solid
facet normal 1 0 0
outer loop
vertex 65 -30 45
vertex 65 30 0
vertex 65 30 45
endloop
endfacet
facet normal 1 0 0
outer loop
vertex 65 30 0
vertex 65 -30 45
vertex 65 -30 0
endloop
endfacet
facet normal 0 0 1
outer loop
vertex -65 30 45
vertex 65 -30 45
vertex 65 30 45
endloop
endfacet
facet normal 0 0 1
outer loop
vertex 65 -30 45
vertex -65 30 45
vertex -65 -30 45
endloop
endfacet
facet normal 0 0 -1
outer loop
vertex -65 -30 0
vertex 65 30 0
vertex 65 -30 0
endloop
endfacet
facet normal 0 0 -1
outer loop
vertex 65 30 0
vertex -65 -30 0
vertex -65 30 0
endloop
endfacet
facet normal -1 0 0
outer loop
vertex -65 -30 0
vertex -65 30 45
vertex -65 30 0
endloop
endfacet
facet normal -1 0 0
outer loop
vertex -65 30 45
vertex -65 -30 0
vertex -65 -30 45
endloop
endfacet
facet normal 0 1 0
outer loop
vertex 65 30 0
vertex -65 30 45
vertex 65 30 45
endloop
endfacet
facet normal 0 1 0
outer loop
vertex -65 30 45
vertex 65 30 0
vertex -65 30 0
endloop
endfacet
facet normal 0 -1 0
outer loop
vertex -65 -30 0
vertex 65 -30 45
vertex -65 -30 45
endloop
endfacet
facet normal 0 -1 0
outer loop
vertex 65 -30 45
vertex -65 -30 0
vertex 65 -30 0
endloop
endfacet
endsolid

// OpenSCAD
// 15 mL conical tube rack – 5 holes, 30° lean, FDM print orientation
// Block rests on the XY plane (z = 0) and is centred on the origin in X and Y.

$fn = 64;

// ---- Block dimensions (measured with calipers) ----
L = 130;   // length along X
W = 60;    // depth along Y
H = 45;    // height along Z

// ---- Hole parameters ----
n_holes   = 5;
spacing   = 24;   // hole-to-hole pitch along X
hole_d    = 17.5; // cylinder diameter, square to its axis
hole_r    = hole_d / 2;
hole_depth = 40;  // depth measured along the hole axis, from the top face

// ---- Lean geometry ----
// Each axis meets the top face at y = -10 and is tilted 30° from vertical
// in the YZ plane; going down into the block it moves toward +Y.
// A 30° tilt from vertical means the axis makes 60° with the +Z direction,
// so the unit vector along the axis (downward) is (0, sin30, -cos30).
tilt_deg  = 30;
tilt_rad  = tilt_deg * 3.141592653589793 / 180;
axis_dir  = [0, sin(tilt_rad), -cos(tilt_rad)]; // unit vector, down into block

// Entry point of each hole on the top face (z = H, y = -10)
y_entry   = -10;

// ---- Build the solid block ----
module block() { translate([-L/2, -W/2, 0]) cube([L, W, H]); }

// ---- Build the five blind holes and subtract them ----
// Each hole is a cylinder of radius hole_r and length hole_depth,
// whose axis is tilted 30° from vertical in the YZ plane.
// We model each hole as a cylinder aligned to +Z, then rotate it so its
// axis follows the required direction, and translate it so the top of
// the cylinder sits at the entry point on the top face.

// The cylinder primitive is built along +Z. We need its axis to point
// along axis_dir = (0, sin30, -cos30). A rotation about the X axis by
// -30° maps +Z to (0, sin30, -cos30).
// After rotation, the cylinder extends from the origin along axis_dir.
// We want the *top* of the cylinder (the end at distance hole_depth along
// the axis) to be at the entry point (x_i, y_entry, H).
// So we translate the rotated cylinder by (x_i, y_entry, H) - hole_depth * axis_dir.

difference() {
    block();
    for (i = [0 : n_holes-1]) {
        x_i = (i - (n_holes-1)/2) * spacing;  // centred on origin in X
        // Translate so the far end of the cylinder (top) is at the entry point
        offset = [x_i, y_entry, H] - hole_depth * axis_dir;
        translate(offset)
        rotate([ -tilt_deg, 0, 0 ])  // tilt axis 30° from vertical toward +Y
        cylinder(h = hole_depth, r = hole_r, $fn = $fn);
    }
}
